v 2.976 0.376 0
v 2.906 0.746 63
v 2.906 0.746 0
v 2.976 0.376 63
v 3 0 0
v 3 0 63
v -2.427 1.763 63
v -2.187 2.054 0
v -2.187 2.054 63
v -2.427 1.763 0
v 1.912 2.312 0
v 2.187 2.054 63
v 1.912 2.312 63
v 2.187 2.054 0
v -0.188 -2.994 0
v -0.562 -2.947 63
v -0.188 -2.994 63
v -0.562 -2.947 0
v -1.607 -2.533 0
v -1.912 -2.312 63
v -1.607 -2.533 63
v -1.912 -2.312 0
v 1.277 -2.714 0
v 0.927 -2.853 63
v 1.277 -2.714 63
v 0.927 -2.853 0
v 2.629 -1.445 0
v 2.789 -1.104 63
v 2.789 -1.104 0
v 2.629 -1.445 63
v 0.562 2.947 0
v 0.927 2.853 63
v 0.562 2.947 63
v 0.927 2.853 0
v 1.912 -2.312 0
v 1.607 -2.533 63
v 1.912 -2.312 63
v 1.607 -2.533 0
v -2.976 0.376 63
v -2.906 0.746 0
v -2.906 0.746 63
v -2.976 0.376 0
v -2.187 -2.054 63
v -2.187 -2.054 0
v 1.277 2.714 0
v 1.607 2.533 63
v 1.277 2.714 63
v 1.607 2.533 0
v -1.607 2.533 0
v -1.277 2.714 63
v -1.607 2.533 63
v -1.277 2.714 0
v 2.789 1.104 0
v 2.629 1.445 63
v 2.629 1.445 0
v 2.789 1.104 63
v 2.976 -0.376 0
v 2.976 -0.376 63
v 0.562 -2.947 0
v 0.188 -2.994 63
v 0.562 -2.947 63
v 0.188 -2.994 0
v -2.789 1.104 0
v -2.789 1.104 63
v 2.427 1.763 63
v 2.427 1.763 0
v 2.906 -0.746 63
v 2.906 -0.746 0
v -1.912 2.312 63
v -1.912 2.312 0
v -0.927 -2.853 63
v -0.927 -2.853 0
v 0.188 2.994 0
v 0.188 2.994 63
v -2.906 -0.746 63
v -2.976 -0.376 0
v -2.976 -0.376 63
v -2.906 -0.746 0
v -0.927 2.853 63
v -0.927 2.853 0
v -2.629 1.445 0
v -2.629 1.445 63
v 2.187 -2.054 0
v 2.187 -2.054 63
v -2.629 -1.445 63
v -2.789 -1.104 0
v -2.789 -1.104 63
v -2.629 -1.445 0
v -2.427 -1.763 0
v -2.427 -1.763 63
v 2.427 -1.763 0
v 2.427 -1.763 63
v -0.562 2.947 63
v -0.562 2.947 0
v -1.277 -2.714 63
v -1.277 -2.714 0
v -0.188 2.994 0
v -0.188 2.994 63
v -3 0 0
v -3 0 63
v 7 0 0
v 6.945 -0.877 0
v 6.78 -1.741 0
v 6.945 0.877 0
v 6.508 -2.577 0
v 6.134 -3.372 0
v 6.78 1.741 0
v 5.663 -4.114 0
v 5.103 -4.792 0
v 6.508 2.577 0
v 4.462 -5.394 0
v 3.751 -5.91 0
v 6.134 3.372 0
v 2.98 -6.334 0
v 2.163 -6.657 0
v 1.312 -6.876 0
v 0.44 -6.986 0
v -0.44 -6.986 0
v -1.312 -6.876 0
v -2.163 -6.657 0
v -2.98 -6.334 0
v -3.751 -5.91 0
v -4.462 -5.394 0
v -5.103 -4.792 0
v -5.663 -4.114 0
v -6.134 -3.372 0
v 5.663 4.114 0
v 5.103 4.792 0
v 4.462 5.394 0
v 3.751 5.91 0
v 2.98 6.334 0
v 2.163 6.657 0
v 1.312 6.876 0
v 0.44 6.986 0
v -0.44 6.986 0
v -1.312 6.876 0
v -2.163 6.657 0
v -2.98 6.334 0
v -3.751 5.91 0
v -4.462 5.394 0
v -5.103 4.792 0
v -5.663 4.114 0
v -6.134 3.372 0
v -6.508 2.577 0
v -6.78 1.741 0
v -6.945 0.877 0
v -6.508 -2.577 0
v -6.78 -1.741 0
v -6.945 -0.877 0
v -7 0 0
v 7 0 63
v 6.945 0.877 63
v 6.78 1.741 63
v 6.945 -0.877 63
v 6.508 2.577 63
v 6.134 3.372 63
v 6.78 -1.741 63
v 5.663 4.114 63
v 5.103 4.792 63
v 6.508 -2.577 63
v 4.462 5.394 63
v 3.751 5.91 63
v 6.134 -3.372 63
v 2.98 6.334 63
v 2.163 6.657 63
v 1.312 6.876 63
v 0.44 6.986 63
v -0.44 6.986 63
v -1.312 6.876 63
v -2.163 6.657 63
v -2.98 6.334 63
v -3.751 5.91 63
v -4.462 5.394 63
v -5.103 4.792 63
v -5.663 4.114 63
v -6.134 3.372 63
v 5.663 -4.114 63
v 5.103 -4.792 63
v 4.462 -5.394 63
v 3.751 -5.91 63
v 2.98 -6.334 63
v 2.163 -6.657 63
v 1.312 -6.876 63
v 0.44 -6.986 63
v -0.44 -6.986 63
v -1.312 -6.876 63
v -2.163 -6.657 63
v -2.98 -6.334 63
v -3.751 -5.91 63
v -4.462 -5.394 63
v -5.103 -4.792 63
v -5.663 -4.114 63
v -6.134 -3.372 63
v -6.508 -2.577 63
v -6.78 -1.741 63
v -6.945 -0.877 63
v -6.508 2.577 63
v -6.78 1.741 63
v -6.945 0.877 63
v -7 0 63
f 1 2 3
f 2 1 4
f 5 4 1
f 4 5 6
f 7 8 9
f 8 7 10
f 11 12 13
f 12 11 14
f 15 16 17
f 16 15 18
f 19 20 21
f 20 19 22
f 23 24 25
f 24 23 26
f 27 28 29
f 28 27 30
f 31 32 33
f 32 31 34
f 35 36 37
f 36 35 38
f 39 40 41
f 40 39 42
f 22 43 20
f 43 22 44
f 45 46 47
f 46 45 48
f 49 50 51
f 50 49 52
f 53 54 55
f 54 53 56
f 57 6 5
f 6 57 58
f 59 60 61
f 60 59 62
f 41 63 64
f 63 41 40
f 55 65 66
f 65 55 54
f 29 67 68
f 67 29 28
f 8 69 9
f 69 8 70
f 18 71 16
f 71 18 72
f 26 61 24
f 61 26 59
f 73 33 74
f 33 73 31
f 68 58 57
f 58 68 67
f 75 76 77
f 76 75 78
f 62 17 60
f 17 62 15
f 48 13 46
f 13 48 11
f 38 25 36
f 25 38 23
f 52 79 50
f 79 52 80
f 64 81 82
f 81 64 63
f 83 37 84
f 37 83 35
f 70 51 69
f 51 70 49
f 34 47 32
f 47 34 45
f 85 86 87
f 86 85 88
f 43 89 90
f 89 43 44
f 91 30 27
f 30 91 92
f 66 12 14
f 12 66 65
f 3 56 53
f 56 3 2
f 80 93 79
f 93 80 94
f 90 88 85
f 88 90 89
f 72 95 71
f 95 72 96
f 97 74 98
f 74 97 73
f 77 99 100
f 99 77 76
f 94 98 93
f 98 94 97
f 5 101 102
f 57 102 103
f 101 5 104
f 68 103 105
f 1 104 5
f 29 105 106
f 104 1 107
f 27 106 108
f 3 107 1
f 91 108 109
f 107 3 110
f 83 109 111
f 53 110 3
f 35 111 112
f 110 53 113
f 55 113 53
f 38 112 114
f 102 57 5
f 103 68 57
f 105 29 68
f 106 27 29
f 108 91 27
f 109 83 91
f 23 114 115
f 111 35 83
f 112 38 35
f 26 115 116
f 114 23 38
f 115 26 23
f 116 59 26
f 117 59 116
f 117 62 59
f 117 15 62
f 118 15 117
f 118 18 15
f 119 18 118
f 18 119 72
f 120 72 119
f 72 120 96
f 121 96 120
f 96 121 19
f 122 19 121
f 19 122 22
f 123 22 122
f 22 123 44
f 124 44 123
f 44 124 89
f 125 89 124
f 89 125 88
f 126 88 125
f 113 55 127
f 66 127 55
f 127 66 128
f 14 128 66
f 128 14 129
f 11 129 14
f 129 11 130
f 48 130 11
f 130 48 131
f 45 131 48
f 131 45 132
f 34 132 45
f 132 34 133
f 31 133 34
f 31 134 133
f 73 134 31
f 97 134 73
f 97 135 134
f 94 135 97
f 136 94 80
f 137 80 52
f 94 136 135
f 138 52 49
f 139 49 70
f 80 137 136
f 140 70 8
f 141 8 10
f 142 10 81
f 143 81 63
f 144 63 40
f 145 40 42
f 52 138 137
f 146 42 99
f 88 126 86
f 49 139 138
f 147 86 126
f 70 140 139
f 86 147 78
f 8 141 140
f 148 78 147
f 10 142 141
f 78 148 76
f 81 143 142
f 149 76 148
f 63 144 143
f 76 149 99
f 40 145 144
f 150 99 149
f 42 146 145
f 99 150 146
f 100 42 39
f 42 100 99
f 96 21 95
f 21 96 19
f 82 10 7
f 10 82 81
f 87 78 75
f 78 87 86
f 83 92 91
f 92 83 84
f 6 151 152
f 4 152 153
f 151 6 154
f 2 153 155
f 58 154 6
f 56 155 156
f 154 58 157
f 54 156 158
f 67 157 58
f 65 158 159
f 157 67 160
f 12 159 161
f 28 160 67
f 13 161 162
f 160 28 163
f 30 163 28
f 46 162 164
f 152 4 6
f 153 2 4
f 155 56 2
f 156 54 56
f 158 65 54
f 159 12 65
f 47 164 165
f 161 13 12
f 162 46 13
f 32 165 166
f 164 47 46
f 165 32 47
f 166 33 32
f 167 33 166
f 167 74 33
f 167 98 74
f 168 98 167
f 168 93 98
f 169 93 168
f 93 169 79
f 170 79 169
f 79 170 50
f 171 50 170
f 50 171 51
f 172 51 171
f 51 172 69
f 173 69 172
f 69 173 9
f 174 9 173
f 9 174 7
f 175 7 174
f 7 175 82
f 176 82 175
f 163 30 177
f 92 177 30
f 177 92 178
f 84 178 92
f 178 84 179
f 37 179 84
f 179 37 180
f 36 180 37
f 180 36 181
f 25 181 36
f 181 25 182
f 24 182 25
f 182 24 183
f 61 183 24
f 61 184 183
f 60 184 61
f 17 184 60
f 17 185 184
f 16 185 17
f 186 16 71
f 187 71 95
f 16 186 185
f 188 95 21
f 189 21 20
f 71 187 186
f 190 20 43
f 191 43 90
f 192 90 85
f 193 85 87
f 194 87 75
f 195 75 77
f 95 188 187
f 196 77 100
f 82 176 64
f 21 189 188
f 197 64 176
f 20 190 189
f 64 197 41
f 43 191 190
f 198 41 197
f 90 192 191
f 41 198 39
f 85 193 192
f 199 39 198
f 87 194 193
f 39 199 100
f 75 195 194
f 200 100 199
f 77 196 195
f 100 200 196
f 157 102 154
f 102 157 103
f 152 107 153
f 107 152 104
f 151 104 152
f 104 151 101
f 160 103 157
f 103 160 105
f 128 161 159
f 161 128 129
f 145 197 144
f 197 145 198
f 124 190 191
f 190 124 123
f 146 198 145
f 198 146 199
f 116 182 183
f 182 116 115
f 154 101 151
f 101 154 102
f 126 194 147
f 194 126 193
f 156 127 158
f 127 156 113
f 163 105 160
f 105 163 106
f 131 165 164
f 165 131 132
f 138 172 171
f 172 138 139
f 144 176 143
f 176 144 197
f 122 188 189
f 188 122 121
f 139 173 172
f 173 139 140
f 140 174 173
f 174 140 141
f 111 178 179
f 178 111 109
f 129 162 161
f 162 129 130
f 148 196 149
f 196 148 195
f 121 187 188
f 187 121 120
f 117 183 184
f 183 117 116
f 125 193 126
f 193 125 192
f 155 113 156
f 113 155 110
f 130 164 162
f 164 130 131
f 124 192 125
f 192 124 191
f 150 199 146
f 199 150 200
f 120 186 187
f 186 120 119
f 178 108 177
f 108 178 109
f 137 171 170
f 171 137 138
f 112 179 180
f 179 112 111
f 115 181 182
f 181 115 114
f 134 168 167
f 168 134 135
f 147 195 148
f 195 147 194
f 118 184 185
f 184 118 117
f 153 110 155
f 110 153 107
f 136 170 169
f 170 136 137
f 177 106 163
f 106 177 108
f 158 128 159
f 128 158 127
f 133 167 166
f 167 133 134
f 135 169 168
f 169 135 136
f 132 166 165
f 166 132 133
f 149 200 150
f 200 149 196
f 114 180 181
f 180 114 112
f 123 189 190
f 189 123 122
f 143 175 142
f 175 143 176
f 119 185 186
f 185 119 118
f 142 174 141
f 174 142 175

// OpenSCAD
$fn = 50;

difference() {
	union() {
		cylinder(h = 63, r = 7.0);
	}
	union() {
		cylinder(h = 63, r = 3.0);
		cylinder(h = 63, r = 1.5);
	}
}
